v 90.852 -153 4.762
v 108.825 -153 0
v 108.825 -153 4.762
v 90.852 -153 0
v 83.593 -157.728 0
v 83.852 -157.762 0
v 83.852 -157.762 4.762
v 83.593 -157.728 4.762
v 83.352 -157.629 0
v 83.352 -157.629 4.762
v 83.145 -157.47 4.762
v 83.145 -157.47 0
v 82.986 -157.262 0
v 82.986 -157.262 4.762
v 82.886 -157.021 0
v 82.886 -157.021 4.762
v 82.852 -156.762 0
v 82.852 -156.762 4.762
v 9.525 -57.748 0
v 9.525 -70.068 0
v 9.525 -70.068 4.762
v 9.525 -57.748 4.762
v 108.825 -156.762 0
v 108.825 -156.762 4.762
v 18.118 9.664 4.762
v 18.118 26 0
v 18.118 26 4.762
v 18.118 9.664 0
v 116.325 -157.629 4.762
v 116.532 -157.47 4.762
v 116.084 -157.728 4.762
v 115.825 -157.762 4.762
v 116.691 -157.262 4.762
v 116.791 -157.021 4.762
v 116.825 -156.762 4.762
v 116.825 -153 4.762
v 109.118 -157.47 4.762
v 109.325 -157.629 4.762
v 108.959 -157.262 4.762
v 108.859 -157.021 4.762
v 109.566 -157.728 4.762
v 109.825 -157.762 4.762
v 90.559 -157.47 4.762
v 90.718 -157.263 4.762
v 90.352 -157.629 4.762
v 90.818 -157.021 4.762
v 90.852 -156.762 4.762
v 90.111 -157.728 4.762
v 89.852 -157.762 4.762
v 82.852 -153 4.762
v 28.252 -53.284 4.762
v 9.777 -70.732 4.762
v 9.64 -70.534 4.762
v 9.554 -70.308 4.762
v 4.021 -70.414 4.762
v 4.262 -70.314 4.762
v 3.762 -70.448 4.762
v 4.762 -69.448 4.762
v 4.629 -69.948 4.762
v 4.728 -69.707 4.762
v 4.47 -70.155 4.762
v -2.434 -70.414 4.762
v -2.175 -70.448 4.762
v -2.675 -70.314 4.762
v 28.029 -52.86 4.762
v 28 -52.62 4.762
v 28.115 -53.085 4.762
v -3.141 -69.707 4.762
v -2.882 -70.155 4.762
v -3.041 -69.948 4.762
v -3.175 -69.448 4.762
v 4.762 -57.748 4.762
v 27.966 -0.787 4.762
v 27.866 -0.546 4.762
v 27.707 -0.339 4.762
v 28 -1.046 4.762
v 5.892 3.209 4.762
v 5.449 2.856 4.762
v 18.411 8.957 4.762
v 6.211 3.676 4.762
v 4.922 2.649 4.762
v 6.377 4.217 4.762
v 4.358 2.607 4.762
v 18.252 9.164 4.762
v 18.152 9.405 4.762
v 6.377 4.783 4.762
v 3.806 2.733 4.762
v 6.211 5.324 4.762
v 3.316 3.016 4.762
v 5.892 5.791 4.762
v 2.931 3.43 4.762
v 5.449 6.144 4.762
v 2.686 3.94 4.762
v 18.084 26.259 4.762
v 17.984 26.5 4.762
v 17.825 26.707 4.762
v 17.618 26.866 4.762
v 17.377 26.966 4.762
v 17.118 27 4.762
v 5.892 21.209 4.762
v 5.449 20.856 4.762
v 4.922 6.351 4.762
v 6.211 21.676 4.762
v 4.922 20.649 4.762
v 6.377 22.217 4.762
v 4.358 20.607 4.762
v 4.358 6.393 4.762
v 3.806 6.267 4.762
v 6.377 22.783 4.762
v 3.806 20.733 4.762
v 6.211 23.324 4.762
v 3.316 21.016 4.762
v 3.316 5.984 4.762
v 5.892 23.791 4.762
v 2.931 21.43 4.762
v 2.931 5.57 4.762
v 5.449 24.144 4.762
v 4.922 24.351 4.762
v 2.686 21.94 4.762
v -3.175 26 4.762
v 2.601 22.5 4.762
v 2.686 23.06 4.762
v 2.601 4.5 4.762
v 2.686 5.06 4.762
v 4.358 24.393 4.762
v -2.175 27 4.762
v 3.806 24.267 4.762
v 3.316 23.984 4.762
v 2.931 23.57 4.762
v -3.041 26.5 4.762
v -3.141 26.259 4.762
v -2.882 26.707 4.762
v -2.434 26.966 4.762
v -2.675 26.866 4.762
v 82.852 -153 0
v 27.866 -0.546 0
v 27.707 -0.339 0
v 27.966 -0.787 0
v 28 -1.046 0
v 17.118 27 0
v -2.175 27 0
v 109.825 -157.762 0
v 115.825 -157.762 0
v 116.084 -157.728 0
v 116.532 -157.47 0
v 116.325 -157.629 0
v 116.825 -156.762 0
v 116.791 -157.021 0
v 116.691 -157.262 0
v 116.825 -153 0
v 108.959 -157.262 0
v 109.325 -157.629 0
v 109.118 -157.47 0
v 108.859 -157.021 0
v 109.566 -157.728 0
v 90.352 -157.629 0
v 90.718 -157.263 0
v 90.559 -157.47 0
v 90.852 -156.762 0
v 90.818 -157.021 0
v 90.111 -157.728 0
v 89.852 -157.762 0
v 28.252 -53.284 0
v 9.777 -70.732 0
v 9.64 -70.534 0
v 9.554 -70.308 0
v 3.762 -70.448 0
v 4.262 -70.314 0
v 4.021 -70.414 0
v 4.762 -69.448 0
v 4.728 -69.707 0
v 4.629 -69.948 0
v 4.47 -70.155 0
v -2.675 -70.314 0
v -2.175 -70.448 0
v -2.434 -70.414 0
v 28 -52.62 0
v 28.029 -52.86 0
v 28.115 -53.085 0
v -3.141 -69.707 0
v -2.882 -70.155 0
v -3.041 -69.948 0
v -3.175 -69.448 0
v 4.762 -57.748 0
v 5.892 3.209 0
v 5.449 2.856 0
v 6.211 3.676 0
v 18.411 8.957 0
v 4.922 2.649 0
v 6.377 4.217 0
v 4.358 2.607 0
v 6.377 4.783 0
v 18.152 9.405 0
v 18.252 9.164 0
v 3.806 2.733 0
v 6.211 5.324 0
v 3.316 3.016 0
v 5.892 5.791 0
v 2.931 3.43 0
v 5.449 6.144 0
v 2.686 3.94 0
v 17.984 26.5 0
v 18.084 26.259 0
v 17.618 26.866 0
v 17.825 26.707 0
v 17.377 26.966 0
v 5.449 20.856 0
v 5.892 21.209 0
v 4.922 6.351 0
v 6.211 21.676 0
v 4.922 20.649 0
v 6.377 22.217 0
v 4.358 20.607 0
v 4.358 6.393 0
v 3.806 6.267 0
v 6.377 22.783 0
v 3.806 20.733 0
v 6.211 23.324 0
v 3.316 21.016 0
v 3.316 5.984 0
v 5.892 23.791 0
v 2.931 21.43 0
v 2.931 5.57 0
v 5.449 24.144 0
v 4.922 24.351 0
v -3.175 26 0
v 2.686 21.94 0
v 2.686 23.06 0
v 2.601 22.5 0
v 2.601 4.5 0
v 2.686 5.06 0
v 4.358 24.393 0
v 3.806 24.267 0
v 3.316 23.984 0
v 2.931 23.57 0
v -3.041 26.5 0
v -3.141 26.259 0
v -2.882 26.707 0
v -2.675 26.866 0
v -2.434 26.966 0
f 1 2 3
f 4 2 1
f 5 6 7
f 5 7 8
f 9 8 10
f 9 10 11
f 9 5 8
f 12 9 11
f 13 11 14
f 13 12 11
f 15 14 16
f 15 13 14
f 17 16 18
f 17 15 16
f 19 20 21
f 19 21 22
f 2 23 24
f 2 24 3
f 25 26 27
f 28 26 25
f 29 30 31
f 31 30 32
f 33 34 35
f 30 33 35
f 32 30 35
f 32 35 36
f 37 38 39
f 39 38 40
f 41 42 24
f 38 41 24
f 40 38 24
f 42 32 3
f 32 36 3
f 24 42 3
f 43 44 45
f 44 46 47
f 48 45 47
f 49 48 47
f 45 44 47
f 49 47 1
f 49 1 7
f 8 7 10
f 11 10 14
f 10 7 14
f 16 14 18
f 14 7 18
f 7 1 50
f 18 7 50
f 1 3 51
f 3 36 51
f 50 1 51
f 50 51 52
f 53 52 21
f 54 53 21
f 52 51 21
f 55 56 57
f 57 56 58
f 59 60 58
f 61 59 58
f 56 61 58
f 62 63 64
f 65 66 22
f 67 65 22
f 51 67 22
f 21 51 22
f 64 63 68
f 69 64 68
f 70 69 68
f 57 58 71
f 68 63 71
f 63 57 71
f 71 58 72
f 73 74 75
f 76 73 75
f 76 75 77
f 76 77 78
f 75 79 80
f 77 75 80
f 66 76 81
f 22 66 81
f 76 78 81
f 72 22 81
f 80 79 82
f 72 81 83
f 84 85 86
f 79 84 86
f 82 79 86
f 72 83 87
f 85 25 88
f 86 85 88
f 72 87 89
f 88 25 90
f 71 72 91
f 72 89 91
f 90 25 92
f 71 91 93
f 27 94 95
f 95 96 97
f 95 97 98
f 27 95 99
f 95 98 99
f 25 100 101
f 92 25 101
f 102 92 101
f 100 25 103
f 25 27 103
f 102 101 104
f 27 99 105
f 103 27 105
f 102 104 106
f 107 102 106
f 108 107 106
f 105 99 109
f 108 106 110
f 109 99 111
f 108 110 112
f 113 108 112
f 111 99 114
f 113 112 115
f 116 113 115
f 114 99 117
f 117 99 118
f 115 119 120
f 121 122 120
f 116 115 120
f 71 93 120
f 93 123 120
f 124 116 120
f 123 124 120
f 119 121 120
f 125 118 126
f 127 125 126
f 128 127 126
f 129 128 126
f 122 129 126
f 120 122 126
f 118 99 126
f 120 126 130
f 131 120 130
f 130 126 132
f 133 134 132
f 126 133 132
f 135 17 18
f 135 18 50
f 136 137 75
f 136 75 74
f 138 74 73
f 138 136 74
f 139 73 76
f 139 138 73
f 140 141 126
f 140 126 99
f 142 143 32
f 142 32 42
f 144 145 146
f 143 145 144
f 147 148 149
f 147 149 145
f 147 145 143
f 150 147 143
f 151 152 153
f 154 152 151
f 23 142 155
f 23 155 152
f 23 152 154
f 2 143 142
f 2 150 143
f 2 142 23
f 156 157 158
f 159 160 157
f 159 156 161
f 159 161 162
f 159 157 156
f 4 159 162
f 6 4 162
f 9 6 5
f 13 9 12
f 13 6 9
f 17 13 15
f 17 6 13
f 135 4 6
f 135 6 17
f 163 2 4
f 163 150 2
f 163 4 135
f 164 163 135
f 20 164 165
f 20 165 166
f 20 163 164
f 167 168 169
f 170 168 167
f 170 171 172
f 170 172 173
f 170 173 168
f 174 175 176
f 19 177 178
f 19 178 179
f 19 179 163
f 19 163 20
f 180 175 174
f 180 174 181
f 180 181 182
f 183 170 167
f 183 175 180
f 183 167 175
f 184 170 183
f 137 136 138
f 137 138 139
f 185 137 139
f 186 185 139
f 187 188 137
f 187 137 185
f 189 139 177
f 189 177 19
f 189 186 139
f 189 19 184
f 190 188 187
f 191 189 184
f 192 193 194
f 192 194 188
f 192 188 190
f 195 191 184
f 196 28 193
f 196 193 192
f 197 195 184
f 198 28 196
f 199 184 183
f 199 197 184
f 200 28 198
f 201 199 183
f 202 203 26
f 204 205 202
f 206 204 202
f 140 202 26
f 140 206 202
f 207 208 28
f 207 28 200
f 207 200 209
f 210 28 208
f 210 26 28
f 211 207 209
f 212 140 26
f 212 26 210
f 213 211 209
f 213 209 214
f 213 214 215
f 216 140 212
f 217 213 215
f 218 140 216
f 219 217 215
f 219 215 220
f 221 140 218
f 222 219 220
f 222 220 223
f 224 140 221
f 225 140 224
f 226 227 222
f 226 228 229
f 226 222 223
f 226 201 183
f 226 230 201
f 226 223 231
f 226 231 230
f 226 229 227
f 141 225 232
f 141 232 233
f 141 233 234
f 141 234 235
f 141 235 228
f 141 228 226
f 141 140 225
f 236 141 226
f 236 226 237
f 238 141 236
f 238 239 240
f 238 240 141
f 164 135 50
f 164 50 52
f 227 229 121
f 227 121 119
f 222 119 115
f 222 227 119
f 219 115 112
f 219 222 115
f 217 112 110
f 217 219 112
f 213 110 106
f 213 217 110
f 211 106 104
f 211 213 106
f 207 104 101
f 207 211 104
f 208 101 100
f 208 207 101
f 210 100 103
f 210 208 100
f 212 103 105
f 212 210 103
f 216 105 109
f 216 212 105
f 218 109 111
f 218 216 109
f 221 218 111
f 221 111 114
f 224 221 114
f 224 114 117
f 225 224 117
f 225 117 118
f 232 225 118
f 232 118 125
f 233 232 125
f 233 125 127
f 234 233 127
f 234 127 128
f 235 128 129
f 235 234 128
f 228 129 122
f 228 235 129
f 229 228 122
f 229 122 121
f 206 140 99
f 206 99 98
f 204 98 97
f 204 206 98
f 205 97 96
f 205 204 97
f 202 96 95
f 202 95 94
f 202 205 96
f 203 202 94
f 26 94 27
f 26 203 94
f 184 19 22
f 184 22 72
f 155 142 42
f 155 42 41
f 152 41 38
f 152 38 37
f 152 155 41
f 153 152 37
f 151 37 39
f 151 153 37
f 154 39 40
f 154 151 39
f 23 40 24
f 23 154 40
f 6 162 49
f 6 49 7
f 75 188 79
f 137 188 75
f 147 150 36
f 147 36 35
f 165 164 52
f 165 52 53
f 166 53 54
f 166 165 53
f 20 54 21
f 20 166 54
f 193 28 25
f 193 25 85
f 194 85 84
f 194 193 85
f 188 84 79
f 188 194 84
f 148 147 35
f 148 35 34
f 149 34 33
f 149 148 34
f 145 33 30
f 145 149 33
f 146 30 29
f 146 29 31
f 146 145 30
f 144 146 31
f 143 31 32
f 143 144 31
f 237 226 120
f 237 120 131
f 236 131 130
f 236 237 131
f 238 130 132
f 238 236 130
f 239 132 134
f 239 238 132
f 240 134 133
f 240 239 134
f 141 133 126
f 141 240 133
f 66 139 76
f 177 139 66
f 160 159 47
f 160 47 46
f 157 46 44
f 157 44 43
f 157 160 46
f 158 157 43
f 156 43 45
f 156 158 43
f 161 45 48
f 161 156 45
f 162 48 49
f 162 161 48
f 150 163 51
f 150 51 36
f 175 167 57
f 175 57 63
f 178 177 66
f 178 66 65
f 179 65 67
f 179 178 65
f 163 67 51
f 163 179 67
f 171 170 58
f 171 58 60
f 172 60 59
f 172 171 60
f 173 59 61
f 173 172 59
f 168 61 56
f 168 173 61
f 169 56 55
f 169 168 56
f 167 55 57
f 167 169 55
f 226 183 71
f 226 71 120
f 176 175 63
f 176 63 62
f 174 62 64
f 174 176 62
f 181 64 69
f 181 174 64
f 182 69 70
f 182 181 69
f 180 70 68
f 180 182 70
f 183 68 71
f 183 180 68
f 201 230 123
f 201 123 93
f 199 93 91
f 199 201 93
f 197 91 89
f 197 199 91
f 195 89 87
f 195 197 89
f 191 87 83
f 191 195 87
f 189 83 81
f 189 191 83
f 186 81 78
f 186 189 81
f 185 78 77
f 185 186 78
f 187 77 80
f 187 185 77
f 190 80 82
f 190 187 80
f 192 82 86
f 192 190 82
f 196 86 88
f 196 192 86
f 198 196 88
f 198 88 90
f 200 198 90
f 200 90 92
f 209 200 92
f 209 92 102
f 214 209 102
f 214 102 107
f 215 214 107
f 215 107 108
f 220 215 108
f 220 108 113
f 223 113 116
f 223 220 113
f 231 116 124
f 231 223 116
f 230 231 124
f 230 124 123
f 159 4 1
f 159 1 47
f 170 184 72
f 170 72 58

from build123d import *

# Parameters (mm, degrees)
SKETCH1_R           = 1.89865
BOSS_EXTRUDE1_DEPTH = 4.7625


with BuildPart() as part:
    # Sketch1 → Boss-Extrude1 (new body)
    with BuildSketch(Plane.XY):
        with BuildLine():
            Line((-2.175, 27), (17.118365096, 27))
            ThreePointArc((17.118365096, 27), (17.825471878, 26.707106781), (18.118365096, 26))
            Line((18.118365096, 26), (18.118365096, 9.664213562))
            ThreePointArc((18.118365096, 9.664213562), (18.194485564, 9.28153013), (18.411258315, 8.957106781))
            Line((18.411258315, 8.957106781), (27.707106781, -0.338741685))
            ThreePointArc((27.707106781, -0.338741685), (27.923879533, -0.663165034), (28, -1.045848466))
            Line((28, -1.045848466), (28, -52.620004972))
            ThreePointArc((28, -52.620004972), (28.065214876, -52.975218671), (28.252353545, -53.284101936))
            Line((28.252353545, -53.284101936), (116.825, -153))
            Line((116.825, -153), (116.825, -156.7625))
            ThreePointArc((116.825, -156.7625), (116.532106781, -157.469606781), (115.825, -157.7625))
            Line((115.825, -157.7625), (109.825, -157.7625))
            ThreePointArc((109.825, -157.7625), (109.117893219, -157.469606781), (108.825, -156.7625))
            Line((108.825, -156.7625), (108.825, -153))
            Line((108.825, -153), (90.851723172, -153))
            Line((90.851723172, -153), (90.851723172, -156.7625))
            ThreePointArc((90.851723172, -156.7625), (90.558829954, -157.469606781), (89.851723172, -157.7625))
            Line((89.851723172, -157.7625), (83.851723172, -157.7625))
            ThreePointArc((83.851723172, -157.7625), (83.144616391, -157.469606781), (82.851723172, -156.7625))
            Line((82.851723172, -156.7625), (82.851723172, -153))
            Line((82.851723172, -153), (9.777353545, -70.73220419))
            ThreePointArc((9.777353545, -70.73220419), (9.590214876, -70.423320926), (9.525, -70.068107226))
            Line((9.525, -70.068107226), (9.525, -57.748102255))
            Line((9.525, -57.748102255), (4.7625, -57.748102255))
            Line((4.7625, -57.748102255), (4.7625, -69.448102255))
            ThreePointArc((4.7625, -69.448102255), (4.469606781, -70.155209036), (3.7625, -70.448102255))
            Line((3.7625, -70.448102255), (-2.175, -70.448102255))
            ThreePointArc((-2.175, -70.448102255), (-2.882106781, -70.155209036), (-3.175, -69.448102255))
            Line((-3.175, -69.448102255), (-3.175, 26))
            ThreePointArc((-3.175, 26), (-2.882106781, 26.707106781), (-2.175, 27))
        make_face()
        with Locations(Location((4.5, 22.5, 0), (0, 0, 180))):
            Circle(SKETCH1_R, mode=Mode.SUBTRACT)
        with Locations(Location((4.5, 4.5, 0), (0, 0, 180))):
            Circle(SKETCH1_R, mode=Mode.SUBTRACT)
    extrude(amount=BOSS_EXTRUDE1_DEPTH)


solid = part.part
